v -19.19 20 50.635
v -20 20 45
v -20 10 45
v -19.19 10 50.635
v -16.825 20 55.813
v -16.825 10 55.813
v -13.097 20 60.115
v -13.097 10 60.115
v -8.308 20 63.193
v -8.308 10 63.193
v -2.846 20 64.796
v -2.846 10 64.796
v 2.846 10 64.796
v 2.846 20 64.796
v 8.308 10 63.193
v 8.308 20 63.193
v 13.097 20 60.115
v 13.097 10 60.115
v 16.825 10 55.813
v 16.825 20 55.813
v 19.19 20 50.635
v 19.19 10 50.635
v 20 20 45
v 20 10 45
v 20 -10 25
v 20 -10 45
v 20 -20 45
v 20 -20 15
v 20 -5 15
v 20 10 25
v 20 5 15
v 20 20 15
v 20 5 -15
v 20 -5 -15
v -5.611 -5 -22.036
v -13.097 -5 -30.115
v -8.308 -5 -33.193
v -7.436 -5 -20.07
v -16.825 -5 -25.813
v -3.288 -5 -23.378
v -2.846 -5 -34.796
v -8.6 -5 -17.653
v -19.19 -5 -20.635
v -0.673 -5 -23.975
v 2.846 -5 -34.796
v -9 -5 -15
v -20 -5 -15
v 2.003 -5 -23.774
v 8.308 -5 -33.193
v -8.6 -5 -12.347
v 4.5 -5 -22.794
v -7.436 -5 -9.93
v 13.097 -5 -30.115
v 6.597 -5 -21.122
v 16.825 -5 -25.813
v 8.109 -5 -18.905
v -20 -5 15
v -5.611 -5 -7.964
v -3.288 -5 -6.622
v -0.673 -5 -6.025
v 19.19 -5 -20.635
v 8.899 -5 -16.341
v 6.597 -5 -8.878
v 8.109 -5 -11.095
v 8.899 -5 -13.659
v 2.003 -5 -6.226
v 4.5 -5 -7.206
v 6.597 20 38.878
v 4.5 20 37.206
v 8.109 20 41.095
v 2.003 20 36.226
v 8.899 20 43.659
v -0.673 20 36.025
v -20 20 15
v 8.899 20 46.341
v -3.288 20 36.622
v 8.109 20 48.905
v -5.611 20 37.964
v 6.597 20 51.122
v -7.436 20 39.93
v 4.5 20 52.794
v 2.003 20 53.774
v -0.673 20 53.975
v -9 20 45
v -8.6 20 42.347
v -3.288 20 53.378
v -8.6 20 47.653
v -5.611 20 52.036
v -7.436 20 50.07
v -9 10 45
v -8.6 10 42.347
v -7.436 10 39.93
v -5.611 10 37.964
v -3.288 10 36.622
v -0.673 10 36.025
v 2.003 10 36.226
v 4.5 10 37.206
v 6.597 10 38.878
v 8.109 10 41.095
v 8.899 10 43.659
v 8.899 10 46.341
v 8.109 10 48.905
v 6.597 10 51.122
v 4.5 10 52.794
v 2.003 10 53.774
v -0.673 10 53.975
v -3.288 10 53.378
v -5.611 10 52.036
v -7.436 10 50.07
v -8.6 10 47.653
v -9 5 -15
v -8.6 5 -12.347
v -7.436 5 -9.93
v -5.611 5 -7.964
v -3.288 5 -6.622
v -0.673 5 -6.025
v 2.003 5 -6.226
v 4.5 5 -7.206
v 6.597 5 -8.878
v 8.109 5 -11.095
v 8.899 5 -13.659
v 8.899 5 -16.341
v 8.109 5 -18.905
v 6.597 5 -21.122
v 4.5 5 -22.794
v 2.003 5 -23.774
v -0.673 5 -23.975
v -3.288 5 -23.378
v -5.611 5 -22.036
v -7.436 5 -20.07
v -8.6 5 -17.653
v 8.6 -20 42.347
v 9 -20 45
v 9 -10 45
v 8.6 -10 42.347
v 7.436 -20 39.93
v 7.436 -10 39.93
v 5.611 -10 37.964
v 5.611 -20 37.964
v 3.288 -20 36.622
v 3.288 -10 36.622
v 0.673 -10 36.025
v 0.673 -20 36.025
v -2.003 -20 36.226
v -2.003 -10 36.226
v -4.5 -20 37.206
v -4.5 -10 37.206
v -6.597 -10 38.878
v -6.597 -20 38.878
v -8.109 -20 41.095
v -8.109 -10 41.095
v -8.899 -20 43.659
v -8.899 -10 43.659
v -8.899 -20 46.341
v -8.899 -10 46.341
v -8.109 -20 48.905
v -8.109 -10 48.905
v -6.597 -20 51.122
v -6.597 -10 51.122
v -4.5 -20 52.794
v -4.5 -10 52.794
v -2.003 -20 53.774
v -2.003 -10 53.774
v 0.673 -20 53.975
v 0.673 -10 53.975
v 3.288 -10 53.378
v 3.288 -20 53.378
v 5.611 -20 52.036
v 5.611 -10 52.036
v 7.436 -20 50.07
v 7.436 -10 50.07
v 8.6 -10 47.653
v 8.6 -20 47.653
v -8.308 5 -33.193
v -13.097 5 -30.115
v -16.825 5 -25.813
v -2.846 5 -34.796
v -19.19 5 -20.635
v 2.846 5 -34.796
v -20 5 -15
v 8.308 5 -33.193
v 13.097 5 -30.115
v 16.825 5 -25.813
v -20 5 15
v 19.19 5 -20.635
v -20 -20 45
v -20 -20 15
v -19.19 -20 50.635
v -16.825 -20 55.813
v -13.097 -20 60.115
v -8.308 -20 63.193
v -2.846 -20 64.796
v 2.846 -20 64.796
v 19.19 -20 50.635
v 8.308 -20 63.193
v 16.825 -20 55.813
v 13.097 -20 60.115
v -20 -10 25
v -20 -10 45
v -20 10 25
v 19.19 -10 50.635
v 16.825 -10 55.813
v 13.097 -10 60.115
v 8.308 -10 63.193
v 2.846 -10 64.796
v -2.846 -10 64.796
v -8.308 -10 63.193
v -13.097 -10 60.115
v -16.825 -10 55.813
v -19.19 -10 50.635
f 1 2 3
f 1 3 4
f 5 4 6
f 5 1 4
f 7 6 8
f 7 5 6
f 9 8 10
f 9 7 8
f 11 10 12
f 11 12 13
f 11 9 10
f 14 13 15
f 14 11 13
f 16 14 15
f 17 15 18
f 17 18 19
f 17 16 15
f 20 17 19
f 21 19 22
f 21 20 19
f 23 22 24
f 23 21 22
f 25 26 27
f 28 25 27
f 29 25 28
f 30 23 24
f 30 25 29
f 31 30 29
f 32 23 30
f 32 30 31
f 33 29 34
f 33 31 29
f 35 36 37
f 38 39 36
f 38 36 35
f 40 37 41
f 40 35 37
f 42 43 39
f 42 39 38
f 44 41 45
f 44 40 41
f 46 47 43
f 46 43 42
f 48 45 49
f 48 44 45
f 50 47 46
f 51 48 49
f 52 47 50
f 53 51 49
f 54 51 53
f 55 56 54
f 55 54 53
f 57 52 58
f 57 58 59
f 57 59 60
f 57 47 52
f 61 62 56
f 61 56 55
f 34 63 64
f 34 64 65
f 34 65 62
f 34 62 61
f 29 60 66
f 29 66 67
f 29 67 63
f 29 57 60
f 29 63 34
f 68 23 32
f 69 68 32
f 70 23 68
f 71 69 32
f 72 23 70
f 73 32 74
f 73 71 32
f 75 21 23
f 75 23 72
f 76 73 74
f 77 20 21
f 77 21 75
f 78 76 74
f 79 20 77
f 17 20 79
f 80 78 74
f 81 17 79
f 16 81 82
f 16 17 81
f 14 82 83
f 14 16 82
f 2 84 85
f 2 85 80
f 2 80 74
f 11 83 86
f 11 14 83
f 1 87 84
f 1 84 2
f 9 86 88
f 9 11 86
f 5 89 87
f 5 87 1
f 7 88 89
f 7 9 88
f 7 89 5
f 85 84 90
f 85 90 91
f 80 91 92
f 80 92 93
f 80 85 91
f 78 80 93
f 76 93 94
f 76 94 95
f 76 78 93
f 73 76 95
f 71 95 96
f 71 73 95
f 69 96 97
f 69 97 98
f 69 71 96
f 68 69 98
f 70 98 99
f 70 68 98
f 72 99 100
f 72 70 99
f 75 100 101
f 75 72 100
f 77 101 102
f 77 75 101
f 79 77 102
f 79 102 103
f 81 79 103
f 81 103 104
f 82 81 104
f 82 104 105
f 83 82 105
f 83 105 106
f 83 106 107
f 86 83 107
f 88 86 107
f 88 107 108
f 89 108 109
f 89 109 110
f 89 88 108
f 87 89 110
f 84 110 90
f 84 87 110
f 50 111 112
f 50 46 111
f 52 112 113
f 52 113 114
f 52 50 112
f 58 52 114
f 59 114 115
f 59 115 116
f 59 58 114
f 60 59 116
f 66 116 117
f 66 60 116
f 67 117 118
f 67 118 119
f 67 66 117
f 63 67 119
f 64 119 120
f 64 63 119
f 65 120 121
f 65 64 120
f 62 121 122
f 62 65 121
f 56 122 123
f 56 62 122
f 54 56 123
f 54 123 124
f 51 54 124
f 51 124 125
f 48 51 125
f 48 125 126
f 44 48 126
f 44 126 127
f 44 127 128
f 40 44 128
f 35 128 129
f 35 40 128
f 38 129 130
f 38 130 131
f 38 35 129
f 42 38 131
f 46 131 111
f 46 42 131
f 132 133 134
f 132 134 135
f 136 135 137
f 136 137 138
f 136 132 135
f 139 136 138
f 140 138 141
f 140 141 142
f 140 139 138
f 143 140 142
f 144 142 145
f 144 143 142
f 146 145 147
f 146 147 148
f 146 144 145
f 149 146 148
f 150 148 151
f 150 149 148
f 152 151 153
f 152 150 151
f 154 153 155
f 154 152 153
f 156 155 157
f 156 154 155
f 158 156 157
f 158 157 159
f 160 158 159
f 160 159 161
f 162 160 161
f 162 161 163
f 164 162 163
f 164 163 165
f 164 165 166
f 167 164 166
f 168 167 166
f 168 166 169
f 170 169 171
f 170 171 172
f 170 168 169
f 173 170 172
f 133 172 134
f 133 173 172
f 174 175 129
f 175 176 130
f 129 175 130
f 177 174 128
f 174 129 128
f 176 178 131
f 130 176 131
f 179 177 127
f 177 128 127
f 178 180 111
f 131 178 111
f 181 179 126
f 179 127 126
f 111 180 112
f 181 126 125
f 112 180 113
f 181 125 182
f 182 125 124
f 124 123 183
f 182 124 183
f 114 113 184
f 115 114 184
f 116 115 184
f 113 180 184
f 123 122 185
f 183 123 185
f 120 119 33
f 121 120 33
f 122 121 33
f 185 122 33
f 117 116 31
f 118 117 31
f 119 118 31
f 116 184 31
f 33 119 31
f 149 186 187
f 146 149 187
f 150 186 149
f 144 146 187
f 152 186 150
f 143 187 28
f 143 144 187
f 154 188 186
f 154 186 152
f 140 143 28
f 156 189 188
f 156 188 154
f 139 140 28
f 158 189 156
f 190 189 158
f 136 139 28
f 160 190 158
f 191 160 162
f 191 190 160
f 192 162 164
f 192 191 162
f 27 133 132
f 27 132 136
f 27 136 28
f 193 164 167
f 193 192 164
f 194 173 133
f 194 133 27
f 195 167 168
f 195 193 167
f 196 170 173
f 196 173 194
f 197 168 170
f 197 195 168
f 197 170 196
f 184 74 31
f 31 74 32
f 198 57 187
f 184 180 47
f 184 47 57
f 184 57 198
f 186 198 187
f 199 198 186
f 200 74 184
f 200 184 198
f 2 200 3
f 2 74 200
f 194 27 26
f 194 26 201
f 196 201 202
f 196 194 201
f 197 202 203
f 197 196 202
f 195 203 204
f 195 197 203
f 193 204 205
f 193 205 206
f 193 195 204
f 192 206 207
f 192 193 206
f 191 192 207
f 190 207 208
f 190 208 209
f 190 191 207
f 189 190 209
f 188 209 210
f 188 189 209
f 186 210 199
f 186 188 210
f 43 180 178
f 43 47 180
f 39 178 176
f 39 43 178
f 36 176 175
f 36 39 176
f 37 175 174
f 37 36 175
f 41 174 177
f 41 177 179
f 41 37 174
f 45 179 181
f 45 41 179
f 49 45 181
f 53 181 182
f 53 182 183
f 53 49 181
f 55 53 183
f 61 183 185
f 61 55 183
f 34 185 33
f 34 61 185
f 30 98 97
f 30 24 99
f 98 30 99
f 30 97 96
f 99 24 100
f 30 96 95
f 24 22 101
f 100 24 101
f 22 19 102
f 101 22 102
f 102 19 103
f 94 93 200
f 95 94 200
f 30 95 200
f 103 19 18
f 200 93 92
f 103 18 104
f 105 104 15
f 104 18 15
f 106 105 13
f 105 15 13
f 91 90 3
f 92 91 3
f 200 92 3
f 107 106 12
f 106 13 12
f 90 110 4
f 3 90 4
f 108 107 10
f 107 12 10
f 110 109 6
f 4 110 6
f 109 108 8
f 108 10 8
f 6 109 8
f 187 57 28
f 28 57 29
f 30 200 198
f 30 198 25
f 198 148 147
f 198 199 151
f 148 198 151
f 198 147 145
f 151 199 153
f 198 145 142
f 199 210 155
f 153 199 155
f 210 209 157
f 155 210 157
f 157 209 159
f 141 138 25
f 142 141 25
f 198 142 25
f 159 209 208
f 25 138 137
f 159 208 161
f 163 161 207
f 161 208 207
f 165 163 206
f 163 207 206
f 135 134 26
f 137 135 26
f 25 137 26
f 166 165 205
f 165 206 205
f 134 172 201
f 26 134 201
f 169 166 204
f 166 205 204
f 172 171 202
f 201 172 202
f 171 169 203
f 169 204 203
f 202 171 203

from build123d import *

# Parameters (mm, degrees)
F1_DEPTH = 5
F2_W     = 40
F2_H     = 40
F3_DEPTH = 10
F5_DEPTH = 10
F7_DEPTH = 10


with BuildPart() as f1:
    # F0 (on Front) → F1 (new body, symmetric)
    with BuildSketch(Plane.XZ):
        with BuildLine():
            ThreePointArc((-20, -15), (0, -35), (20, -15))
            Line((20, -15), (9, -15))
            ThreePointArc((9, -15), (0, -24), (-9, -15))
            Line((-9, -15), (-20, -15))
        make_face()
        with BuildLine():
            Line((9, -15), (20, -15))
            Line((20, -15), (20, 15))
            Line((20, 15), (-20, 15))
            Line((-20, 15), (-20, -15))
            Line((-20, -15), (-9, -15))
            ThreePointArc((-9, -15), (0, -6), (9, -15))
        make_face()
    extrude(amount=F1_DEPTH, both=True)

    # F2 (on face) → F3 (join)
    with BuildSketch(Plane.XY.offset(15)):
        Rectangle(F2_W, F2_H)
    extrude(amount=F3_DEPTH)

    # F4 (on face) → F5 (join)
    with BuildSketch(Plane.XZ.offset(20)):
        with BuildLine():
            ThreePointArc((-9, 45), (0, 54), (9, 45))
            Line((9, 45), (20, 45))
            ThreePointArc((20, 45), (0, 65), (-20, 45))
            Line((-20, 45), (-9, 45))
        make_face()
        with BuildLine():
            Line((20, 45), (9, 45))
            ThreePointArc((9, 45), (0, 36), (-9, 45))
            Line((-9, 45), (-20, 45))
            Line((-20, 45), (-20, 25))
            Line((-20, 25), (20, 25))
            Line((20, 25), (20, 45))
        make_face()
    extrude(amount=-F5_DEPTH)

    # F6 (on face) → F7 (join)
    with BuildSketch(Plane(origin=(0, 20, 0), x_dir=(-1, 0, 0), z_dir=(0, 1, 0))):
        with BuildLine():
            ThreePointArc((-9, 45), (0, 54), (9, 45))
            Line((9, 45), (20, 45))
            ThreePointArc((20, 45), (0, 65), (-20, 45))
            Line((-20, 45), (-9, 45))
        make_face()
        with BuildLine():
            Line((20, 45), (9, 45))
            ThreePointArc((9, 45), (0, 36), (-9, 45))
            Line((-9, 45), (-20, 45))
            Line((-20, 45), (-20, 25))
            Line((-20, 25), (20, 25))
            Line((20, 25), (20, 45))
        make_face()
    extrude(amount=-F7_DEPTH)


solid = f1.part
